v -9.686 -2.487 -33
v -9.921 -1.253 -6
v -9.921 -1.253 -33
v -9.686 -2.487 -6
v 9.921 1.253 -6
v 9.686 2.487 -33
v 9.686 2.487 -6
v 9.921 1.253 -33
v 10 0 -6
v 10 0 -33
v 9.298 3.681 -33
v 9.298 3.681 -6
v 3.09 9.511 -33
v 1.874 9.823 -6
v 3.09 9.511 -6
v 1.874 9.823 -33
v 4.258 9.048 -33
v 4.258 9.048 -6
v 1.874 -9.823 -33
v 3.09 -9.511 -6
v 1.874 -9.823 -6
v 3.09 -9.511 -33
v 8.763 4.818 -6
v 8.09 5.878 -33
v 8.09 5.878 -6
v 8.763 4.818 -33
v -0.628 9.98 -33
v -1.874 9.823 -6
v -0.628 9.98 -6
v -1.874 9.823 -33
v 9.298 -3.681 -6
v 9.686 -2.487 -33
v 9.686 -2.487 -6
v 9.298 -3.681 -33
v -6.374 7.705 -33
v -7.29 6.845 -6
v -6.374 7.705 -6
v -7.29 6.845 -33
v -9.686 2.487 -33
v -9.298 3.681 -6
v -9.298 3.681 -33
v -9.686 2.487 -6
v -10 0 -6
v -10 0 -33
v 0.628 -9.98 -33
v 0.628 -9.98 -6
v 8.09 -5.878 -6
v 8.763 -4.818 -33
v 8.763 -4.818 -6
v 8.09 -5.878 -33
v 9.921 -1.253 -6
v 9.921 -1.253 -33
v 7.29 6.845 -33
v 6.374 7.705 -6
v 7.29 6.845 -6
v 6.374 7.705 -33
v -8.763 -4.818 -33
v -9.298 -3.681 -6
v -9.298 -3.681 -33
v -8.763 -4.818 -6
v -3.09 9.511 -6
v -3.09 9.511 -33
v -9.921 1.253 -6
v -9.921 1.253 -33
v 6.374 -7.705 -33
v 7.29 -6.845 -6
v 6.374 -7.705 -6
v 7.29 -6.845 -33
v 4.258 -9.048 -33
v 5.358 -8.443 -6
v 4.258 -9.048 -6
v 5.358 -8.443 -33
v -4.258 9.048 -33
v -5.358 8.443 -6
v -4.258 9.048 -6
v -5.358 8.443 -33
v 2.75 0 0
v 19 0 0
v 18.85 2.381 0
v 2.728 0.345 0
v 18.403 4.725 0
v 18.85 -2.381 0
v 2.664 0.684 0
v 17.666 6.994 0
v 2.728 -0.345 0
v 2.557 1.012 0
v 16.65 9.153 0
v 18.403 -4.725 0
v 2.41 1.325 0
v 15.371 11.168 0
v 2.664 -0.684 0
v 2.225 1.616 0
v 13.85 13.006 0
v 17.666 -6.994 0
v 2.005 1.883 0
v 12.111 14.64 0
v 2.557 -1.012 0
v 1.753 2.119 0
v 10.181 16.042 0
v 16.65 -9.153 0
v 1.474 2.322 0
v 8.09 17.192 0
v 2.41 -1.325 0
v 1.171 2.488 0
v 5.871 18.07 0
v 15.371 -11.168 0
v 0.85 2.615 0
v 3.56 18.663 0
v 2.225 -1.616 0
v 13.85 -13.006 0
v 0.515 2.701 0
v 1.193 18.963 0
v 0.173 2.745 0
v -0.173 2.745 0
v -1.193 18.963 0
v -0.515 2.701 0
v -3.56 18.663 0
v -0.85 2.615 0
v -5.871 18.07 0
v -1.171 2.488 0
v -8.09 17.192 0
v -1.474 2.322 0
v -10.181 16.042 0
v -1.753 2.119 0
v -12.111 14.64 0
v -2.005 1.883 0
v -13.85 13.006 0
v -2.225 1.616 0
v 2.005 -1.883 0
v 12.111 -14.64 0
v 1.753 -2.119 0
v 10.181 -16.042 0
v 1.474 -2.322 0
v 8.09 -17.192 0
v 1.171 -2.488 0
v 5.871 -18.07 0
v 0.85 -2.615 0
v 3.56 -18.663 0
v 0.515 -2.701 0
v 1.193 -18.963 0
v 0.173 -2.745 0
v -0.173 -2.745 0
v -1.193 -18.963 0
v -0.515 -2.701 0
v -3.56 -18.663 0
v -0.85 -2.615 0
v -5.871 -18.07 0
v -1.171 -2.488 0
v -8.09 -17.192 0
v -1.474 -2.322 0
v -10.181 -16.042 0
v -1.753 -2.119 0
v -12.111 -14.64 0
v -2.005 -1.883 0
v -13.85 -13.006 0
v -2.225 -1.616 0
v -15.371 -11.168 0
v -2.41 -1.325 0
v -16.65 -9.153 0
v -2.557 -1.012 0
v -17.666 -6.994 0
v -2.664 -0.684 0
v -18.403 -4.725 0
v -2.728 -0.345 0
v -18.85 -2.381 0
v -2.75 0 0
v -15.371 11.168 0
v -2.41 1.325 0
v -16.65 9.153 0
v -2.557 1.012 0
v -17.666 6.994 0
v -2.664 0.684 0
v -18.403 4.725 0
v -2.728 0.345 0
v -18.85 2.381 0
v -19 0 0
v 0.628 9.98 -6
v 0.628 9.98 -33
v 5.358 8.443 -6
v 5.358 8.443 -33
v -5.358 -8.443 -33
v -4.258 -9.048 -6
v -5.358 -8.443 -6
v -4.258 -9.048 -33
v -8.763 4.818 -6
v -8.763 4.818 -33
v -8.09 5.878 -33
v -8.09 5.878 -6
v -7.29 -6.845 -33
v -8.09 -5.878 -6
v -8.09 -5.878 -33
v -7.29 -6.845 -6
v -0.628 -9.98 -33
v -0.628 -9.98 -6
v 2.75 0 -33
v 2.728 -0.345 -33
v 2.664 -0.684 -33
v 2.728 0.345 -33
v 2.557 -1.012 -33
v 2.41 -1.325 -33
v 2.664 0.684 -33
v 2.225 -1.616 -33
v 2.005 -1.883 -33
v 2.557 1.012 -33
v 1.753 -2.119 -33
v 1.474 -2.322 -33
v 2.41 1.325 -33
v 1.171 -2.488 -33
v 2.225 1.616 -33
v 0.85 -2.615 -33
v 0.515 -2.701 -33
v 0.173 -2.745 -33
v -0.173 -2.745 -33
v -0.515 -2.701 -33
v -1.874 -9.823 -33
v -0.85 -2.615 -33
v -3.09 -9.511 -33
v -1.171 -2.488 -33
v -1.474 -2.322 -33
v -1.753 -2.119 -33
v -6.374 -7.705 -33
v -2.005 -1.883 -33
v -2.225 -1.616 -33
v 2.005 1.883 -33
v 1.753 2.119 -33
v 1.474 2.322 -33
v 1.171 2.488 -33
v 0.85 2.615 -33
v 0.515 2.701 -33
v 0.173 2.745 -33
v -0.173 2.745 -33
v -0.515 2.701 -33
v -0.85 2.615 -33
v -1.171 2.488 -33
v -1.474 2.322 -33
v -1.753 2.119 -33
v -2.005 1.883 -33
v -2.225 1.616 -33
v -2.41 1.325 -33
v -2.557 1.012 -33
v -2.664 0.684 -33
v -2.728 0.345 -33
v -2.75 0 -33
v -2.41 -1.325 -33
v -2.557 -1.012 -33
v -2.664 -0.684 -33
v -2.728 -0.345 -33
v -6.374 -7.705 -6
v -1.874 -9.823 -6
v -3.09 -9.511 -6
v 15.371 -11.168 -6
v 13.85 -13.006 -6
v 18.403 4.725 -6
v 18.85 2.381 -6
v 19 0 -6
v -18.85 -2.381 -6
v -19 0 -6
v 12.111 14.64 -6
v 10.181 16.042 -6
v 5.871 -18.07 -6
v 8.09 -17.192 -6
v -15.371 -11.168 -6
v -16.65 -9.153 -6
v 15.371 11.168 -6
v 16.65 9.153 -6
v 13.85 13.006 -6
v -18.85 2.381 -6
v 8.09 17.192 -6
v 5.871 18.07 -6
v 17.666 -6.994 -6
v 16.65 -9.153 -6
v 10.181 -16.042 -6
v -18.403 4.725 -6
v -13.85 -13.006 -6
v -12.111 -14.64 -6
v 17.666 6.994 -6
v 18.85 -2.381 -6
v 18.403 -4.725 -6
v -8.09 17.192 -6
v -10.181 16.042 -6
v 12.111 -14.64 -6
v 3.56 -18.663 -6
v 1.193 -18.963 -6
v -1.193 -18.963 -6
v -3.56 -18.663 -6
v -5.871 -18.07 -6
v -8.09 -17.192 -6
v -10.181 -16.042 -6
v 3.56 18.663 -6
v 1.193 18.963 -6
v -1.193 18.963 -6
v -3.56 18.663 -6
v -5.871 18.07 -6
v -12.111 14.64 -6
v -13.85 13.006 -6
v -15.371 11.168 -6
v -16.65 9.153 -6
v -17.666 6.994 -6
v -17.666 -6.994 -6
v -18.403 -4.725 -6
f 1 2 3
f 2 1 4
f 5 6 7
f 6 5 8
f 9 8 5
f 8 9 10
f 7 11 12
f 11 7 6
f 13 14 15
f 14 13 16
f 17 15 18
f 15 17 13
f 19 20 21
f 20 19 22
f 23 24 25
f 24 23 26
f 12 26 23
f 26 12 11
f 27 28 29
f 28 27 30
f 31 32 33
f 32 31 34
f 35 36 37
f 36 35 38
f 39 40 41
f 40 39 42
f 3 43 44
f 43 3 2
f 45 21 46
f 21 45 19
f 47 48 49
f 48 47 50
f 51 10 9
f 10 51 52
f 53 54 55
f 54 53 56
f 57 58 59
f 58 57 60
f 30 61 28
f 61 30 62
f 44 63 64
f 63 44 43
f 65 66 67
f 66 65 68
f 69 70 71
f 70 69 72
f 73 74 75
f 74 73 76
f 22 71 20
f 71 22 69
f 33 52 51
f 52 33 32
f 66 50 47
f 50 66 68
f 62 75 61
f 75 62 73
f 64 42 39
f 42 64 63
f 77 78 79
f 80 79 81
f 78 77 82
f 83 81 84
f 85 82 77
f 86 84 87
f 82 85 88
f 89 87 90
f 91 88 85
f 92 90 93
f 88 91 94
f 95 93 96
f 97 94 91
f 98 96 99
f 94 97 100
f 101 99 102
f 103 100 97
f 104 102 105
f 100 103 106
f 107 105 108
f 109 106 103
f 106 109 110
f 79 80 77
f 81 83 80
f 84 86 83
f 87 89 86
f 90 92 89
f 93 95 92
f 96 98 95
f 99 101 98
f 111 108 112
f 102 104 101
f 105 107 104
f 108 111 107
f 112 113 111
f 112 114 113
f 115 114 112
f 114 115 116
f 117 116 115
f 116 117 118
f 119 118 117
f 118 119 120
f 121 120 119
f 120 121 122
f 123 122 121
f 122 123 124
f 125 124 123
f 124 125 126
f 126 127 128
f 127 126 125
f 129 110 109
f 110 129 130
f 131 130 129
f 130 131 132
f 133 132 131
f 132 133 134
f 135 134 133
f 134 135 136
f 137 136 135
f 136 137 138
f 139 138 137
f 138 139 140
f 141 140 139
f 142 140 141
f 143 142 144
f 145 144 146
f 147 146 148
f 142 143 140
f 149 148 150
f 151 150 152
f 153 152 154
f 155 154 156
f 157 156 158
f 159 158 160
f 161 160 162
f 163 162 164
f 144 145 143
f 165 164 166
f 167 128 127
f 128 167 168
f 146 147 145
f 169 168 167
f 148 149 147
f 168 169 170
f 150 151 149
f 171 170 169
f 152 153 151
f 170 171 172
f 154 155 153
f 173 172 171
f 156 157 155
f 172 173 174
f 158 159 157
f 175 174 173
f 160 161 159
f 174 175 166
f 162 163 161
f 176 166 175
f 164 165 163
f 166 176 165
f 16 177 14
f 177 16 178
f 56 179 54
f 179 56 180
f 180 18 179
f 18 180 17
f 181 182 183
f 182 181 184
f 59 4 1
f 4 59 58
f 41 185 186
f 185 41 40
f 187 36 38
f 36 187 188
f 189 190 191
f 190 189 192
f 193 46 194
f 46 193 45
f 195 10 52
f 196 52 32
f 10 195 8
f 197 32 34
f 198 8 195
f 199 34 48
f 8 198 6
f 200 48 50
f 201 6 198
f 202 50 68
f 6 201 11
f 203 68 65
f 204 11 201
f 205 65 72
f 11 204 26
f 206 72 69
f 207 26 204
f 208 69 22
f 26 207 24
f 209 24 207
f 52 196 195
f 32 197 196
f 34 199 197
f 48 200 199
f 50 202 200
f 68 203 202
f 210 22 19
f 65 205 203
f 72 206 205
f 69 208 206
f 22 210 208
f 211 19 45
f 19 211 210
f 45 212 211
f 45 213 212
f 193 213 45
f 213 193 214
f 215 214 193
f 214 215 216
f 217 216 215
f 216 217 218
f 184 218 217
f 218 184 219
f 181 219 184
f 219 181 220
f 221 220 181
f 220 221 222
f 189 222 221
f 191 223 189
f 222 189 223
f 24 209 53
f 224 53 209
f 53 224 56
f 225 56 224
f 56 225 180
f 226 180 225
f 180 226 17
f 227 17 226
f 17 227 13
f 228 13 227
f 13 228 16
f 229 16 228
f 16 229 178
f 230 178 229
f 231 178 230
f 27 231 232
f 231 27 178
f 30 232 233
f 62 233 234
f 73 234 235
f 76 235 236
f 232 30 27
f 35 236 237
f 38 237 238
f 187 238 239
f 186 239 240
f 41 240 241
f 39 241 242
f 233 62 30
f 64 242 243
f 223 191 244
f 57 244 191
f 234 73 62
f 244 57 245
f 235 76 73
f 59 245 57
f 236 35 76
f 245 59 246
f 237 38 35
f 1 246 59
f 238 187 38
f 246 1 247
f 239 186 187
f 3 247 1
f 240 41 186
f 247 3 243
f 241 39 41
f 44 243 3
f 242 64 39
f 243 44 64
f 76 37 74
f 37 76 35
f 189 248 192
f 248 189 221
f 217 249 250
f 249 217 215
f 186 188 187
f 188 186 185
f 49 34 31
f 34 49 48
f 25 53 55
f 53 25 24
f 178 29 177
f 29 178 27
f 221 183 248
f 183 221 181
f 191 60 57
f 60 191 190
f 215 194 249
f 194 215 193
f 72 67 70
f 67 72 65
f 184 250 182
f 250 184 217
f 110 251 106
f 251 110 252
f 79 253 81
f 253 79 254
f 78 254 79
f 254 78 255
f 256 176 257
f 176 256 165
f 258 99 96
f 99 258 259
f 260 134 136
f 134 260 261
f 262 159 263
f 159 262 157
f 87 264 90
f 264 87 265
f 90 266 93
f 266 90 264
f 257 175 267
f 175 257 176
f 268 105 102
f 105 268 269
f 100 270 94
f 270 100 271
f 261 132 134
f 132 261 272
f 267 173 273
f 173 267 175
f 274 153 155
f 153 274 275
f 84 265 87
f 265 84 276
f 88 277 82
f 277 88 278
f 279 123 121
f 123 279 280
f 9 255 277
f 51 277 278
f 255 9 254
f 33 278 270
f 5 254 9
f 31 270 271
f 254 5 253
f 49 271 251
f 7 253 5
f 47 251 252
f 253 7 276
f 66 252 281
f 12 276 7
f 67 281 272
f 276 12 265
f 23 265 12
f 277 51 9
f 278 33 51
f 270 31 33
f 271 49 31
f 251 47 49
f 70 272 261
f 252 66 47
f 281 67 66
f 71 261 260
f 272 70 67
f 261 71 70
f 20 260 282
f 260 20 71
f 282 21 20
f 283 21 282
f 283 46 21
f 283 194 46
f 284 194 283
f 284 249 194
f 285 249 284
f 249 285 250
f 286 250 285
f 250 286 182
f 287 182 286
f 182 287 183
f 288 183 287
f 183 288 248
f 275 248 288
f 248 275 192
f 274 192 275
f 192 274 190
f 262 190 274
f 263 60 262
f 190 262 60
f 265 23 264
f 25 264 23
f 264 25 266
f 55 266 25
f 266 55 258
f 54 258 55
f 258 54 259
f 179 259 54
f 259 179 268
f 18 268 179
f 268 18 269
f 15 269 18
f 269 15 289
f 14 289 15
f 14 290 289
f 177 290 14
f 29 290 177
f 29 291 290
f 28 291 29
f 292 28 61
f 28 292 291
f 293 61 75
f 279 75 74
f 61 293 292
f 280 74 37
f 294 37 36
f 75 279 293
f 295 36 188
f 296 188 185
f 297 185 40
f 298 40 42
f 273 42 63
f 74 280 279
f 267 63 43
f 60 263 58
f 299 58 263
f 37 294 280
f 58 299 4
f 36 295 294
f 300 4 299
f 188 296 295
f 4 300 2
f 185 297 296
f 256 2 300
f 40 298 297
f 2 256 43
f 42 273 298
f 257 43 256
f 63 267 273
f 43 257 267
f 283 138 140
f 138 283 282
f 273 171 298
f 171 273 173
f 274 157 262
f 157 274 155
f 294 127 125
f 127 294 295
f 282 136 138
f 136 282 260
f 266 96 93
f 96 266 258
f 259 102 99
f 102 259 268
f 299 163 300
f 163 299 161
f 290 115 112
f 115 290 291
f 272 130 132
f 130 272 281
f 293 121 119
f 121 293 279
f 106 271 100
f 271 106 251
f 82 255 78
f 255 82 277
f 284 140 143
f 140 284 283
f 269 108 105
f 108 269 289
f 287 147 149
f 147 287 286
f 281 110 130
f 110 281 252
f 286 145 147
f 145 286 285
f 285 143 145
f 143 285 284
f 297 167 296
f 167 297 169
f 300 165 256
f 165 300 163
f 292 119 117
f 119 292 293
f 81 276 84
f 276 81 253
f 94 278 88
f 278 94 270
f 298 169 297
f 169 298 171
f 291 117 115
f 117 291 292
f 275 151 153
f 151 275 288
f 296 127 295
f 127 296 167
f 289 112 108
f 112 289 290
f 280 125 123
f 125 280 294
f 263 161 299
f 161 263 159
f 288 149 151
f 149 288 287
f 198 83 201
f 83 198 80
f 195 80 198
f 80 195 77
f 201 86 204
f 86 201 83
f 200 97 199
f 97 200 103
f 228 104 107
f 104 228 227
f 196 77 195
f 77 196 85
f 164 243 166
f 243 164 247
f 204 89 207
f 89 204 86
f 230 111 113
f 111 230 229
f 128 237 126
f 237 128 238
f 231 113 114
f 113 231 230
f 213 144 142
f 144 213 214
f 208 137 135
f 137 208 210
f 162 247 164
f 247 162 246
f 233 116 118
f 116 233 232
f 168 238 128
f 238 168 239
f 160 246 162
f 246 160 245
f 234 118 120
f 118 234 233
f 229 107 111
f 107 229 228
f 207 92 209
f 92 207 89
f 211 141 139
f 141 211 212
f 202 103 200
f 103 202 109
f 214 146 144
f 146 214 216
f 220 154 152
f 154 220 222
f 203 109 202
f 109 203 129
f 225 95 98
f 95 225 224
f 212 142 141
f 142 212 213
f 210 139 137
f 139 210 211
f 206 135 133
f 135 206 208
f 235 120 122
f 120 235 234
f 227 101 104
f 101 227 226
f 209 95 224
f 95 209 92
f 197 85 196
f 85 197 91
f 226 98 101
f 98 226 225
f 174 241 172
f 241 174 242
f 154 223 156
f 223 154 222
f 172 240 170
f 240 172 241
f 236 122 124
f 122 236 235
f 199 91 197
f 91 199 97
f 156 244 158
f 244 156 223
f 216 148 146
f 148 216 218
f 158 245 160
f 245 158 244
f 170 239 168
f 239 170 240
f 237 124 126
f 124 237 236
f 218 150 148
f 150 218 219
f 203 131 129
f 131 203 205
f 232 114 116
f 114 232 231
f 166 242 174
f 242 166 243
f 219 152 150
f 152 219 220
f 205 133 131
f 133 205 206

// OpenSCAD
$fn = 50;


difference() {
	union() {
		translate(v = [0, 0, -33.0000000000]) {
			cylinder(h = 33, r = 10.0000000000);
		}
		translate(v = [0, 0, -6.0000000000]) {
			cylinder(h = 6, r = 19.0000000000);
		}
	}
	union() {
		#translate(v = [0, 0, -33]) {
			cylinder(h = 33, r = 2.7500000000);
		}
	}
}
